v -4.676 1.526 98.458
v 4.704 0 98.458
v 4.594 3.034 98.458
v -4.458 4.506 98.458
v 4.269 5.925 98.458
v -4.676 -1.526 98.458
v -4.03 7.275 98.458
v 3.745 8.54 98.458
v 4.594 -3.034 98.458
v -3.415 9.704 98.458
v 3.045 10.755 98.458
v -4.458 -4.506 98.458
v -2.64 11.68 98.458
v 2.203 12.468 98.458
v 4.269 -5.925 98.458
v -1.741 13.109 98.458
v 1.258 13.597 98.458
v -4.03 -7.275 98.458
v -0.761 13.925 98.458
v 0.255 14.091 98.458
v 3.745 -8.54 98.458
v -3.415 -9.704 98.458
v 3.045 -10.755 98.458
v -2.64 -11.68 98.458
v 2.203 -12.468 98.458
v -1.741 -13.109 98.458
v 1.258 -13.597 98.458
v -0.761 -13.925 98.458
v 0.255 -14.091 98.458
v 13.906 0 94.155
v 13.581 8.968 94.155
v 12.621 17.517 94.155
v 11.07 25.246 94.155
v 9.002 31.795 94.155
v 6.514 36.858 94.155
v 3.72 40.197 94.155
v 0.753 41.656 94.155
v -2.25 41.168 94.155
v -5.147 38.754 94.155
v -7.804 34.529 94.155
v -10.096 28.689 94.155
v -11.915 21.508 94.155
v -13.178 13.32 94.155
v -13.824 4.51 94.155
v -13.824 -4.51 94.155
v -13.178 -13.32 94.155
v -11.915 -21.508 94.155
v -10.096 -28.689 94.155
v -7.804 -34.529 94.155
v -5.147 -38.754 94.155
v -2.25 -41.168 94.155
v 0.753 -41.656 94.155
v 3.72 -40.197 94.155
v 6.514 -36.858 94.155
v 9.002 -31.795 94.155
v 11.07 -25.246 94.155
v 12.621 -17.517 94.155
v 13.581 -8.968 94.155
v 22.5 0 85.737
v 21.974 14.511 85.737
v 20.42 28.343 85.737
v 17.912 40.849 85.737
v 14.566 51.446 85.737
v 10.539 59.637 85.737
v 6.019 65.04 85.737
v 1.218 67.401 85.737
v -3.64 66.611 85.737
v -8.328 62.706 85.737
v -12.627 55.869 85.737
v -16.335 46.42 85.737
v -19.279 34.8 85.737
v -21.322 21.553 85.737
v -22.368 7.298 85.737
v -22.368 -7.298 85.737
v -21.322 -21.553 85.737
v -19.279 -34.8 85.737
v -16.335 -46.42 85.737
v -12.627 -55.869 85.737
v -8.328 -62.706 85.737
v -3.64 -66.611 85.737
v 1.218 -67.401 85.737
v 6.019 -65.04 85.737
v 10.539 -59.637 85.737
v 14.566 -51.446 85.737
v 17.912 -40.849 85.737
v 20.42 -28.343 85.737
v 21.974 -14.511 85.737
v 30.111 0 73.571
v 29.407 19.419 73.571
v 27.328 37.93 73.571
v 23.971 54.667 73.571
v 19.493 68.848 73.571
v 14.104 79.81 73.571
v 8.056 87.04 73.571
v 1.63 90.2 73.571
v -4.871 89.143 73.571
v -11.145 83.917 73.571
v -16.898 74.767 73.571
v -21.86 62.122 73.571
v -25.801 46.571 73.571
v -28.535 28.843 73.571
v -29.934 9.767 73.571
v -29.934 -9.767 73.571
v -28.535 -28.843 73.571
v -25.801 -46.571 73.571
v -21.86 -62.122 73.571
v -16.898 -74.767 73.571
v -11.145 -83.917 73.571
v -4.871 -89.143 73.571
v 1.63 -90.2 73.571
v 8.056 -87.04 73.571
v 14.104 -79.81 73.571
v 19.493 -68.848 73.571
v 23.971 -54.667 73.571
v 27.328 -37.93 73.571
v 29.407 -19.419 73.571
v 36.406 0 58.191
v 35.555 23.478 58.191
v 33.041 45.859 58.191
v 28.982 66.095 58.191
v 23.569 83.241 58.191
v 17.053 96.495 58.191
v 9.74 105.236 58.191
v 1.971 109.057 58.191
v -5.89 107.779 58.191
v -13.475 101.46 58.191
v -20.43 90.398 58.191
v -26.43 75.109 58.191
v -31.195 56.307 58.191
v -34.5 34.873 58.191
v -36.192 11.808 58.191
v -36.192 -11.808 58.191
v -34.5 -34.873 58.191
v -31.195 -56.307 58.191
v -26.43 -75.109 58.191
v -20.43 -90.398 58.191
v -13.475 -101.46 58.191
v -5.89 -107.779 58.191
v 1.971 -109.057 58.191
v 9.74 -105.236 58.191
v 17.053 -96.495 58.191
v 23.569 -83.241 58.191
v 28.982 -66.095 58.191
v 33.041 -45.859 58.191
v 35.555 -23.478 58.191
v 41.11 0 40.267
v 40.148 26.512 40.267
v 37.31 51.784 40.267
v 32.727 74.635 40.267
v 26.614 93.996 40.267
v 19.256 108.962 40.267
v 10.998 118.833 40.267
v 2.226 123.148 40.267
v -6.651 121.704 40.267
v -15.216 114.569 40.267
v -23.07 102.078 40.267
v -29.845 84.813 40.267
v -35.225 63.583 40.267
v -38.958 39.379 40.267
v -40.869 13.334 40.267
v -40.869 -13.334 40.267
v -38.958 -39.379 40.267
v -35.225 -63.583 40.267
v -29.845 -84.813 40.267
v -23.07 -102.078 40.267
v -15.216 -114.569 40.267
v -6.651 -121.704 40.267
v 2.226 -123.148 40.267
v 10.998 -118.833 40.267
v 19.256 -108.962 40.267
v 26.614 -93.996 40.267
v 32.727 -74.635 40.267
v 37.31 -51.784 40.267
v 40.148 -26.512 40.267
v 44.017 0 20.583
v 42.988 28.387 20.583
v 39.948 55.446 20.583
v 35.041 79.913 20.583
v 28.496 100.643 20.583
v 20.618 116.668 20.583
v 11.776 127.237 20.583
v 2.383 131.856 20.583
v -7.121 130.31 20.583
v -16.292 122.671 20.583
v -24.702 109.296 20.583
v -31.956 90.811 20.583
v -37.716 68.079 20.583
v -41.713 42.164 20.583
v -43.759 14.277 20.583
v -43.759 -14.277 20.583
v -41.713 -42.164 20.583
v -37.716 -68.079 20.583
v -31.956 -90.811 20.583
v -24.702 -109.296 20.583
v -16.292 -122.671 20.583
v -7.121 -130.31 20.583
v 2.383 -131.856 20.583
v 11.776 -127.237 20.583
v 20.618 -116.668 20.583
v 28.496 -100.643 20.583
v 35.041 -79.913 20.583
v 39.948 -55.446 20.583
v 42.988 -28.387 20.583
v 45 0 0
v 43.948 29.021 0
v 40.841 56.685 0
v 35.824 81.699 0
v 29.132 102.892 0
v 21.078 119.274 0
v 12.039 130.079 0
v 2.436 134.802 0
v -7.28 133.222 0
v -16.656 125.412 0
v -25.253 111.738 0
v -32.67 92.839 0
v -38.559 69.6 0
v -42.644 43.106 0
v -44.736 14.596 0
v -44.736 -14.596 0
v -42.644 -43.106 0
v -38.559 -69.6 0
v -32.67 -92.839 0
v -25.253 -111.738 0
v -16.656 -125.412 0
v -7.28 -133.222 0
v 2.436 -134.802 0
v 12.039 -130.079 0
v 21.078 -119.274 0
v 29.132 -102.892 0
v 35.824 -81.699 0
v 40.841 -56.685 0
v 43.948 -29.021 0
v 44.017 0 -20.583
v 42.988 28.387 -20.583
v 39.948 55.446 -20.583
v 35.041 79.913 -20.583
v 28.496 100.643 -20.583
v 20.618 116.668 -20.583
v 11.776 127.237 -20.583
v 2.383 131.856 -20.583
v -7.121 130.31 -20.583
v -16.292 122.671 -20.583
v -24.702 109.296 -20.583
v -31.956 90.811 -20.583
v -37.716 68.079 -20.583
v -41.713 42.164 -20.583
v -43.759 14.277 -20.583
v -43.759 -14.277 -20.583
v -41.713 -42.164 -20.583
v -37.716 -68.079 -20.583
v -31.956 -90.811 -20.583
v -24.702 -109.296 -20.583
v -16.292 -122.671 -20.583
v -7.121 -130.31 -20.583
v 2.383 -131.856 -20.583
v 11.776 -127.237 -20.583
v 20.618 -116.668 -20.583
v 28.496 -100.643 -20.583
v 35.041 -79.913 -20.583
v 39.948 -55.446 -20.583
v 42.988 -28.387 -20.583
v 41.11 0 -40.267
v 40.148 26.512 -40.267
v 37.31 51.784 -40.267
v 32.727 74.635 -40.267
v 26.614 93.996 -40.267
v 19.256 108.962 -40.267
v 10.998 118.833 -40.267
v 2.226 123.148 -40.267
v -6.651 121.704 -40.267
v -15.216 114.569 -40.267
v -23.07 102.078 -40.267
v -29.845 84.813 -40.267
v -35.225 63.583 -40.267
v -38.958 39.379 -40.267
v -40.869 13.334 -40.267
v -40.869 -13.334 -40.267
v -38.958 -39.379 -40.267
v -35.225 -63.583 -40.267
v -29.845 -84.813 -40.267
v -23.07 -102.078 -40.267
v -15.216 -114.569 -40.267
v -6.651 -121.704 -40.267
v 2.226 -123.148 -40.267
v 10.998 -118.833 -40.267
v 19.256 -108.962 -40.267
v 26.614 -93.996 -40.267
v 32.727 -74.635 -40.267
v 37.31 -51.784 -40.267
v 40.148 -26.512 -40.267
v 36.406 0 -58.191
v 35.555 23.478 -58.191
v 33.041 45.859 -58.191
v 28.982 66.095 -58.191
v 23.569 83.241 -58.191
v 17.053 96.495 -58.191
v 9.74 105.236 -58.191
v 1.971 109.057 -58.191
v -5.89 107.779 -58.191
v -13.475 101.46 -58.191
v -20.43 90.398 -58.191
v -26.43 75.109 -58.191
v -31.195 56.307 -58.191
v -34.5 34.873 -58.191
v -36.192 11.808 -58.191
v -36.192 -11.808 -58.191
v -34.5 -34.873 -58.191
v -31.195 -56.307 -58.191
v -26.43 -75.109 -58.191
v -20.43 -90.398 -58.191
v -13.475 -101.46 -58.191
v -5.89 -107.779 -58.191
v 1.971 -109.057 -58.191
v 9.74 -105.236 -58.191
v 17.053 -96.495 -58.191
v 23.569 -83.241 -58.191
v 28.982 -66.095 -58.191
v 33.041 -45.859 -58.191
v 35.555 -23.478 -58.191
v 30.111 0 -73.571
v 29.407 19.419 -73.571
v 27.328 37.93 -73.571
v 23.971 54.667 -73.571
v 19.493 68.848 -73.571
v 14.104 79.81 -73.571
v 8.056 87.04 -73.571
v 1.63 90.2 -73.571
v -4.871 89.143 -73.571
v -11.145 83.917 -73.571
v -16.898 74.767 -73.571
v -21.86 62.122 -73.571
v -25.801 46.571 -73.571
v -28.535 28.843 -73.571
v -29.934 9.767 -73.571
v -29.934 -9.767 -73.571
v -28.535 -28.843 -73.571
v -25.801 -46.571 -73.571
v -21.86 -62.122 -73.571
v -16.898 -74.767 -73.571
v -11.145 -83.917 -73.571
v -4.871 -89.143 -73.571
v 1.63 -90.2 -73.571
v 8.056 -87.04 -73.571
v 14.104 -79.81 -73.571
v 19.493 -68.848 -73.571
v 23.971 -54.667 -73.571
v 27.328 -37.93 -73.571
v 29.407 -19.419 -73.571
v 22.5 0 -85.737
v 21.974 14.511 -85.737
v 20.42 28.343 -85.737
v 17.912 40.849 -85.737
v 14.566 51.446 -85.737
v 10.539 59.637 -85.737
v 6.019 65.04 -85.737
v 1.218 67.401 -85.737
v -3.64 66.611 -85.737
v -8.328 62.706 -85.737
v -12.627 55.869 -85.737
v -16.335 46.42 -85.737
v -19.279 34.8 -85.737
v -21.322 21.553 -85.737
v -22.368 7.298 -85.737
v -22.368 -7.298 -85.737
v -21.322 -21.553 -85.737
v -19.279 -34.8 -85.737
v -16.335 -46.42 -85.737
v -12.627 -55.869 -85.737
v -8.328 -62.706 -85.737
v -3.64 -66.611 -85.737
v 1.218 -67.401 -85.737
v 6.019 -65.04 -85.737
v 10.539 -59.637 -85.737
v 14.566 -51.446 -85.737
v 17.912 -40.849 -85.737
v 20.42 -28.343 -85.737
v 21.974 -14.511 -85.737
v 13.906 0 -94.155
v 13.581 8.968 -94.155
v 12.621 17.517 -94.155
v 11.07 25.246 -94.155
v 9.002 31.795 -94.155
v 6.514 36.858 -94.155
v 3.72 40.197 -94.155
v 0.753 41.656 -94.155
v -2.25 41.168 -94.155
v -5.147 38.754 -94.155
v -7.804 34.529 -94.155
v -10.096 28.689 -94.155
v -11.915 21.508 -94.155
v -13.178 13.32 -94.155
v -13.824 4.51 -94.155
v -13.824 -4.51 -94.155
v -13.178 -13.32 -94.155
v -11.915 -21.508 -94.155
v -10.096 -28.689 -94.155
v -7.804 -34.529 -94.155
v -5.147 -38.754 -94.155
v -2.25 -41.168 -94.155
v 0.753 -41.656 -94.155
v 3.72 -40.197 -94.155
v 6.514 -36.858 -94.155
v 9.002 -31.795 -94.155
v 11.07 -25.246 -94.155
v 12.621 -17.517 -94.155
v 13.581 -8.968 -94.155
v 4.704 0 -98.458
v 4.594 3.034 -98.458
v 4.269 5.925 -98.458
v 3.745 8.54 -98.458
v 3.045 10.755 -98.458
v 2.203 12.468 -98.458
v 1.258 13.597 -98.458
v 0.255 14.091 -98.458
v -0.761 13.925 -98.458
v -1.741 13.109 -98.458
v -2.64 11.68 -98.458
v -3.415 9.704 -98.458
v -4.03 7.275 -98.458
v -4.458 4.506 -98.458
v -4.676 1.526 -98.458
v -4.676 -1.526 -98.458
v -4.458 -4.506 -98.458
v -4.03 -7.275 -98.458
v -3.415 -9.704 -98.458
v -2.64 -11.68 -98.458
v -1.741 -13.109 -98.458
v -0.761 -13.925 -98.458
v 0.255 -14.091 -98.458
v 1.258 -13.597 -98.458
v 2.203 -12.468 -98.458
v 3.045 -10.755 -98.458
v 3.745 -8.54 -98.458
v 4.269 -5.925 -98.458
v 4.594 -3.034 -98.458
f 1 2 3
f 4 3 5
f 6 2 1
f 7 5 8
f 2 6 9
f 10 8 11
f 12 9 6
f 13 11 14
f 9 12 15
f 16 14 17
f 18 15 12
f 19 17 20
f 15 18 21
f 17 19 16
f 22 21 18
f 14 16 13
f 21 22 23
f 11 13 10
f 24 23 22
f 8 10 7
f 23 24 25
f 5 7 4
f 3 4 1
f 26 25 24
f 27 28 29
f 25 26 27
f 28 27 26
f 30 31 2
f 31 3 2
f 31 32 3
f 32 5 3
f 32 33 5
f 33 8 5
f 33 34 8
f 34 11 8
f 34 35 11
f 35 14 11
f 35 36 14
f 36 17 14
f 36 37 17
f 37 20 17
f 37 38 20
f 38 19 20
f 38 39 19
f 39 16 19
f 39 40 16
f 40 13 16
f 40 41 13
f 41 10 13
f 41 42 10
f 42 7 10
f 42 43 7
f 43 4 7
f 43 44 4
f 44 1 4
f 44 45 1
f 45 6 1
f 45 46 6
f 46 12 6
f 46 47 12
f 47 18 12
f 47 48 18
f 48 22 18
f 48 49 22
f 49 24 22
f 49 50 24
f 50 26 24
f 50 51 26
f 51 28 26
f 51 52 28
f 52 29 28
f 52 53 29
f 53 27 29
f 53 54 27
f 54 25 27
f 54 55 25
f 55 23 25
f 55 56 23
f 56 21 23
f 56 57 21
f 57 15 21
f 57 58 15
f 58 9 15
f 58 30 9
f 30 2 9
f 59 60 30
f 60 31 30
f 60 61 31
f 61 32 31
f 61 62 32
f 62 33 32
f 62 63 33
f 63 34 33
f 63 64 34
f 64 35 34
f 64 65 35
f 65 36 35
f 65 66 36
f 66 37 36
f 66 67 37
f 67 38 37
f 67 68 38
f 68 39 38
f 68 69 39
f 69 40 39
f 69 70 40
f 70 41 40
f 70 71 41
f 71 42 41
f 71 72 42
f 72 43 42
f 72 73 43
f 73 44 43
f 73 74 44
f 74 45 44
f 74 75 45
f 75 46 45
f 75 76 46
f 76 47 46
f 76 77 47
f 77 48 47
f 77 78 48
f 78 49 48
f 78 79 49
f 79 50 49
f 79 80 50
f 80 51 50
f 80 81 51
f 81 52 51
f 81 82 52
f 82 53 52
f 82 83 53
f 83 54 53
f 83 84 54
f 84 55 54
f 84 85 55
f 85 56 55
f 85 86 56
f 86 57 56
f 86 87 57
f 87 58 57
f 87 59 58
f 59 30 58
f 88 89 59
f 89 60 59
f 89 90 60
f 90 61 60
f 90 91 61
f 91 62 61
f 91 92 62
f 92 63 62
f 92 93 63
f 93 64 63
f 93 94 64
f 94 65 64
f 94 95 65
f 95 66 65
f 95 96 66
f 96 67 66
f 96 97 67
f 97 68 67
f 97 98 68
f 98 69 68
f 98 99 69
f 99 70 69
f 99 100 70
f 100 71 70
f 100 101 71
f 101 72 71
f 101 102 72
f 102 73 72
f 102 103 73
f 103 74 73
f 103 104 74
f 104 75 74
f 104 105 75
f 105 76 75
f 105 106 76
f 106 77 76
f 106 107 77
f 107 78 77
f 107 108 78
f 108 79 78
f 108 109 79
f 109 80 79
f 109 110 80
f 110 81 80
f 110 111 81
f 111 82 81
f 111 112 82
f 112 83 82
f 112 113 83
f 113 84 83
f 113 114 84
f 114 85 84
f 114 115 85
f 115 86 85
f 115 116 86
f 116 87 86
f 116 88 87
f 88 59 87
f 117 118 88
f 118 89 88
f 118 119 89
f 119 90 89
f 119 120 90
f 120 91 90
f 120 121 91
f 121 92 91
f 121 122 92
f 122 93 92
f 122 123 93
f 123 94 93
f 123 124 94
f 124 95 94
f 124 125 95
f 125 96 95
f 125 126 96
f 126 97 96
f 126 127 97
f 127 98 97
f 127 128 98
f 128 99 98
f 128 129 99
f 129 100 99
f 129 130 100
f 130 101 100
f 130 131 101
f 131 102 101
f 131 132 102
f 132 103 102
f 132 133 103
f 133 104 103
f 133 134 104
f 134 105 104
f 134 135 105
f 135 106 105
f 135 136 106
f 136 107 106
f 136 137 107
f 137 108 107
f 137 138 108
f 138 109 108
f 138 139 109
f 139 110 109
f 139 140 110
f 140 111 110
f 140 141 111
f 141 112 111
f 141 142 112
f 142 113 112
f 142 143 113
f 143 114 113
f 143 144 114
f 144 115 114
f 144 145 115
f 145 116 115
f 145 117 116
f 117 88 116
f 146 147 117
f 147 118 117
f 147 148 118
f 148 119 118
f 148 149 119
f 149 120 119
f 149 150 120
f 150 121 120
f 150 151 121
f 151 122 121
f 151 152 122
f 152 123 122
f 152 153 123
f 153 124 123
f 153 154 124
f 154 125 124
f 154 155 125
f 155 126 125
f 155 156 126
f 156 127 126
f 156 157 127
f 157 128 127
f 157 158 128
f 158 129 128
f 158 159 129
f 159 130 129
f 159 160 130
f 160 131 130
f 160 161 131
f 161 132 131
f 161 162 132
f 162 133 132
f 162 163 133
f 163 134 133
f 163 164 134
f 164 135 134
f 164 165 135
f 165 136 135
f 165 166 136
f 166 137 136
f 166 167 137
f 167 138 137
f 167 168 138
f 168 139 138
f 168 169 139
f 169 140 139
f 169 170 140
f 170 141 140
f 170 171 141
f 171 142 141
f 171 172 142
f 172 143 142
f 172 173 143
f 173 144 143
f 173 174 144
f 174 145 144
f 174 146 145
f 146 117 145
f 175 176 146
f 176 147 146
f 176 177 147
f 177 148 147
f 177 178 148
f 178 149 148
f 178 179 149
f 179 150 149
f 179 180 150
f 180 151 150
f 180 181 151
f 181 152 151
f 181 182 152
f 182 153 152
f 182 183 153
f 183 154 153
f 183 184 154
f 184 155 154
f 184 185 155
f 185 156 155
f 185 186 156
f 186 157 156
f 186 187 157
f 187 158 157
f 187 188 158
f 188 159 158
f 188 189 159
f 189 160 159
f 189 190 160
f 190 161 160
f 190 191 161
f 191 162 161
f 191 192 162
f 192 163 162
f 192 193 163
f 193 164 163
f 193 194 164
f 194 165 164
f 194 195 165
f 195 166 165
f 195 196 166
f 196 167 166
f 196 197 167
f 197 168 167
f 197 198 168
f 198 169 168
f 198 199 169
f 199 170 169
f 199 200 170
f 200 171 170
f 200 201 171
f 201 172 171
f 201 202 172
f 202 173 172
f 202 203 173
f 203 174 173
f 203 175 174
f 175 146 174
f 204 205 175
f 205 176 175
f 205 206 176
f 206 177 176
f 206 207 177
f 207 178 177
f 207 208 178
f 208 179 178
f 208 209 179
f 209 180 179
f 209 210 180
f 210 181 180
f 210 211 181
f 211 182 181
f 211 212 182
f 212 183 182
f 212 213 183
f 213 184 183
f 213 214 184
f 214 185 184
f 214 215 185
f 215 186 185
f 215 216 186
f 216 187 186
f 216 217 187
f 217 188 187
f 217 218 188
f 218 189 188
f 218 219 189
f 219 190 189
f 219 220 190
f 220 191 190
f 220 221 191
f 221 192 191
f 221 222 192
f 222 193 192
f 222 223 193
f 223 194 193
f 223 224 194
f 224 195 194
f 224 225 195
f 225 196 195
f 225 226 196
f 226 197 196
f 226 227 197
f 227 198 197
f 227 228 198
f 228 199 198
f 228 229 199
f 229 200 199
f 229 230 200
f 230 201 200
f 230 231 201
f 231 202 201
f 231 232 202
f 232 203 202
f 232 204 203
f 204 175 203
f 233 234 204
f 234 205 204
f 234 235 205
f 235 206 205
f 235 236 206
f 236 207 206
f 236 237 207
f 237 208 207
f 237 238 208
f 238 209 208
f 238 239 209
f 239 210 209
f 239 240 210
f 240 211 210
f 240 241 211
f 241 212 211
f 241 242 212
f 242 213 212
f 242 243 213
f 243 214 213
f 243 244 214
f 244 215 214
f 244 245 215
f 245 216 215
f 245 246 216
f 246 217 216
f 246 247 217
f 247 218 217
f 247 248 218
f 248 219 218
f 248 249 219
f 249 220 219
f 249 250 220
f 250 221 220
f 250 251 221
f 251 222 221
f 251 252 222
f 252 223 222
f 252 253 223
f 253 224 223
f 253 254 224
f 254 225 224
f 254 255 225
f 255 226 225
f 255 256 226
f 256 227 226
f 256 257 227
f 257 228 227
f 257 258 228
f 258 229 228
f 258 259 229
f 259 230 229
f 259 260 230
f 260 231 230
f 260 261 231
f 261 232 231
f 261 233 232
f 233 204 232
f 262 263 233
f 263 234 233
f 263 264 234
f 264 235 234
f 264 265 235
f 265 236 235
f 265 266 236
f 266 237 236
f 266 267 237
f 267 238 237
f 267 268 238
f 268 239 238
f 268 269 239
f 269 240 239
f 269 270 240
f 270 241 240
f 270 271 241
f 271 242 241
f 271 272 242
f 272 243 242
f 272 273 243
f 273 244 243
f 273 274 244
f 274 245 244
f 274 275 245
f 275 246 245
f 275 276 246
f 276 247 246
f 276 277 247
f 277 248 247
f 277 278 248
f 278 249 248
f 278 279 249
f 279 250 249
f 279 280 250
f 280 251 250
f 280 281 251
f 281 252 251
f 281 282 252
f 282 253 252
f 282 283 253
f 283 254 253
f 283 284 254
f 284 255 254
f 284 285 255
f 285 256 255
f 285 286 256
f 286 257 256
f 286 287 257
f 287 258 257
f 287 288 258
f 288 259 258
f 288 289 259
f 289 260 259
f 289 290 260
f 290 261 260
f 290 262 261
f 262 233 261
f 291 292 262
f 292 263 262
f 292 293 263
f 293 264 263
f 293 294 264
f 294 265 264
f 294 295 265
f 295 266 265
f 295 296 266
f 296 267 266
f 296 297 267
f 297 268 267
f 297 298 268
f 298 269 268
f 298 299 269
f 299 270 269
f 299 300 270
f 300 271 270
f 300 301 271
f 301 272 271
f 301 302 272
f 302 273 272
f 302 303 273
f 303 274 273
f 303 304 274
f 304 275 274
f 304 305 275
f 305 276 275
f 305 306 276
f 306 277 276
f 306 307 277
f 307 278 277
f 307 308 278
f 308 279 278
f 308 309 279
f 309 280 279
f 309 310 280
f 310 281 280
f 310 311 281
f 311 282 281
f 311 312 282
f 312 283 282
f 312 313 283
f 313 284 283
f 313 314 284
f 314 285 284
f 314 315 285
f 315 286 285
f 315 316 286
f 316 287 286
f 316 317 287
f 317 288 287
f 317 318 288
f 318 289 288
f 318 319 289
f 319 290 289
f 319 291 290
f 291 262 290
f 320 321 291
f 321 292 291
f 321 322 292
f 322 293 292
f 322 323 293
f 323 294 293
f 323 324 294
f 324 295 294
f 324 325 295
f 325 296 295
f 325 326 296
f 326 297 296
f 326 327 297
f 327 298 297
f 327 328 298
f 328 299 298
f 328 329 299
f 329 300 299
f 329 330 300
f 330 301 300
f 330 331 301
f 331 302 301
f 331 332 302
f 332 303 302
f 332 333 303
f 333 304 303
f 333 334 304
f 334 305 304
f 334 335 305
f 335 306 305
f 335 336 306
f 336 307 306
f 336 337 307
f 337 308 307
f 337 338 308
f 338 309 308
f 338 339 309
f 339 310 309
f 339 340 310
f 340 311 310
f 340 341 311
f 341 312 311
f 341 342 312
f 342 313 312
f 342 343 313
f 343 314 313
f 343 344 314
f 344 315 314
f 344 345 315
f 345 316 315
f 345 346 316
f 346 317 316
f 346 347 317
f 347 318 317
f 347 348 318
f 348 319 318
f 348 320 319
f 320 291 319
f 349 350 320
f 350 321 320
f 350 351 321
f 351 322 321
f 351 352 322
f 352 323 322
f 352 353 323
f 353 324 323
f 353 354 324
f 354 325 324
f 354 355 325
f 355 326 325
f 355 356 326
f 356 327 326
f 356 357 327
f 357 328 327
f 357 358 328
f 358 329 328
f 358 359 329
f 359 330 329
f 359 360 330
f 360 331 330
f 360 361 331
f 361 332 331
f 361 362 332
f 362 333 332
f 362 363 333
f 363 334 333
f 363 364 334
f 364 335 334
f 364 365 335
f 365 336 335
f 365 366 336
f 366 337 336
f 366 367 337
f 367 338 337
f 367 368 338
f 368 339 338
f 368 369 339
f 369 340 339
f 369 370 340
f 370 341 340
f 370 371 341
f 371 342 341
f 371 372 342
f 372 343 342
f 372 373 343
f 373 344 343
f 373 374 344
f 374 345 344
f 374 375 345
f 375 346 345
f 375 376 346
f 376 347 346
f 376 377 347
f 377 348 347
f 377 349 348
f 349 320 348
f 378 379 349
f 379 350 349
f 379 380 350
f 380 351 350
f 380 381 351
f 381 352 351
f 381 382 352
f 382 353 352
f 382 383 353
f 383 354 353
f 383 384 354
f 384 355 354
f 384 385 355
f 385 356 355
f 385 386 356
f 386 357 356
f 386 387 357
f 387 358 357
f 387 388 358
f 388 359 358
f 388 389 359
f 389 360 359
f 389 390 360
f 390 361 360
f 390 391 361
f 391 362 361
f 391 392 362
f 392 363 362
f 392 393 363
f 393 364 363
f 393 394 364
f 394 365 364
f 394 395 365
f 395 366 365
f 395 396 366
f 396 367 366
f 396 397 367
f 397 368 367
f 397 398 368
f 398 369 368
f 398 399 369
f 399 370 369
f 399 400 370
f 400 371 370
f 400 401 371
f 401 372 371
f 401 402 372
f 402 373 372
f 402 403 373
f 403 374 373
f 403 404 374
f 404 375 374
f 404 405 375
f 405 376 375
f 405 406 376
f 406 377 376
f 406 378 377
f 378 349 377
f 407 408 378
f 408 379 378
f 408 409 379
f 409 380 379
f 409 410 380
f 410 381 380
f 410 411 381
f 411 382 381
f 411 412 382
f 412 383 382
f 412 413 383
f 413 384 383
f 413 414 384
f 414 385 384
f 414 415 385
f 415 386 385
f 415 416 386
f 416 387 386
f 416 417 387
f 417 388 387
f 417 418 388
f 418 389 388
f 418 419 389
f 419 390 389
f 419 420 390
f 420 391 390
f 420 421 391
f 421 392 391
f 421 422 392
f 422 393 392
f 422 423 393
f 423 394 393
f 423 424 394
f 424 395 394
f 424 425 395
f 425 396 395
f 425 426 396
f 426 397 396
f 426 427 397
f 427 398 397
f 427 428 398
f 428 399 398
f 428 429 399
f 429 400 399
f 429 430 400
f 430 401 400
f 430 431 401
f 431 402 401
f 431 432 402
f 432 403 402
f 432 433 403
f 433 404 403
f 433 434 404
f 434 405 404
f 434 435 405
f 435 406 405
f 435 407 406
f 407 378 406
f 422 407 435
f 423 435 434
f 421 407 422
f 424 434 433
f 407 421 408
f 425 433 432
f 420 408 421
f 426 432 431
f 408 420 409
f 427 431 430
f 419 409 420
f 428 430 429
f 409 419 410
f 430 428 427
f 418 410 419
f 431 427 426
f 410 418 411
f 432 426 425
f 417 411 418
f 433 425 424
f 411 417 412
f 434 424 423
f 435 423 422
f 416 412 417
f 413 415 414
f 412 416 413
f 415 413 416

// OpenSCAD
// Generated by SolidPython 1.0.1 on 2020-07-29 00:46:46


scale(v = [5, 15, 11]) {
	sphere(r = 9);
}
/***********************************************
*********      SolidPython code:      **********
************************************************
 
# import packages: SolidPython
from solid import *
from solid.utils import *
from itertools import chain, combinations, permutations


class Resize:

    def __init__(self, scad_file):
        self.scad_file = scad_file
        #self.scad_file = import_scad(scad_file)
        # cone/cylinder param:
        self.r1 = 0
        self.r2 = 0
        self.h = 0
        # rectangular prism param:
        self.w = 0
        self.l = 0
        # ellipse param:
        self.r = 0

    # import OpenScad code (file name corresponds to shape)


    # classify shape + parameters
    def assign(self, param1, param2, param3):
        if self.scad_file == 'cone.scad':
            self.r1 = param1
            self.r2 = param2
            self.h = param3
        elif self.scad_file == 'cylinder.scad':
            self.r1 = param1
            self.r2 = param2
            self.h = param3
        elif self.scad_file == 'rectangularPrism.scad':
            self.h = param1
            self.l = param2
            self.w = param3
        else:
            self.r = param1
            self.h = param2

    # resize parameters
    def iterate(self):
        x = range(3, 20, 2)
        i = 1
        if self.scad_file == 'cone.scad':
            tempList = list(permutations(x, 2))
            for temp in tempList:
                param1 = temp[0]
                param2 = temp[1]
                filepath = 'produced_scad_files/' + 'cone' + str(param1) + '_' + str(param2) + '_' + '.scad'
                scad_render_to_file(cylinder(h=param1, r1=param2, r2=0), filepath)

        elif self.scad_file == 'cylinder.scad':
            tempList = list(permutations(x, 3))
            for temp in tempList:
                param1 = temp[0]
                param2 = temp[1]
                filepath = 'produced_scad_files/' + 'cylinder' + str(param1) + '_' + str(param2) + '_' + '.scad'
                scad_render_to_file(cylinder(h=param1, r1=param2, r2=param2), filepath)

        elif self.scad_file == 'rectangularPrism.scad':
            tempList = list(permutations(x, 3))
            for temp in tempList:
                param1 = temp[0]
                param2 = temp[1]
                param3 = temp[2]
                filepath = 'produced_scad_files/' + 'rectangularPrism' + str(param1) + '_' + str(param2) + '_' + str(
                    param3) + '.scad'
                scad_render_to_file(cube(size=(param1, param2, param3)), filepath)

        elif self.scad_file == 'ellipse.scad':
            tempList = list(permutations(x, 4))
            for temp in tempList:
                param1 = temp[0]
                param2 = temp[1]
                param3 = temp[2]
                param4 = temp[3]
                filepath = 'produced_scad_files/' + 'ellipse' + str(param1) + '_' + str(param2) + '_' + str(param3) + '_' + str(param4) + '.scad'
                scad_render_to_file(scale([param1, param2, param3])(sphere(r=param4)), filepath)

    def render_to_scadfile(self):
        scad_render_to_file(scad, 'example.scad') 
 
************************************************/
